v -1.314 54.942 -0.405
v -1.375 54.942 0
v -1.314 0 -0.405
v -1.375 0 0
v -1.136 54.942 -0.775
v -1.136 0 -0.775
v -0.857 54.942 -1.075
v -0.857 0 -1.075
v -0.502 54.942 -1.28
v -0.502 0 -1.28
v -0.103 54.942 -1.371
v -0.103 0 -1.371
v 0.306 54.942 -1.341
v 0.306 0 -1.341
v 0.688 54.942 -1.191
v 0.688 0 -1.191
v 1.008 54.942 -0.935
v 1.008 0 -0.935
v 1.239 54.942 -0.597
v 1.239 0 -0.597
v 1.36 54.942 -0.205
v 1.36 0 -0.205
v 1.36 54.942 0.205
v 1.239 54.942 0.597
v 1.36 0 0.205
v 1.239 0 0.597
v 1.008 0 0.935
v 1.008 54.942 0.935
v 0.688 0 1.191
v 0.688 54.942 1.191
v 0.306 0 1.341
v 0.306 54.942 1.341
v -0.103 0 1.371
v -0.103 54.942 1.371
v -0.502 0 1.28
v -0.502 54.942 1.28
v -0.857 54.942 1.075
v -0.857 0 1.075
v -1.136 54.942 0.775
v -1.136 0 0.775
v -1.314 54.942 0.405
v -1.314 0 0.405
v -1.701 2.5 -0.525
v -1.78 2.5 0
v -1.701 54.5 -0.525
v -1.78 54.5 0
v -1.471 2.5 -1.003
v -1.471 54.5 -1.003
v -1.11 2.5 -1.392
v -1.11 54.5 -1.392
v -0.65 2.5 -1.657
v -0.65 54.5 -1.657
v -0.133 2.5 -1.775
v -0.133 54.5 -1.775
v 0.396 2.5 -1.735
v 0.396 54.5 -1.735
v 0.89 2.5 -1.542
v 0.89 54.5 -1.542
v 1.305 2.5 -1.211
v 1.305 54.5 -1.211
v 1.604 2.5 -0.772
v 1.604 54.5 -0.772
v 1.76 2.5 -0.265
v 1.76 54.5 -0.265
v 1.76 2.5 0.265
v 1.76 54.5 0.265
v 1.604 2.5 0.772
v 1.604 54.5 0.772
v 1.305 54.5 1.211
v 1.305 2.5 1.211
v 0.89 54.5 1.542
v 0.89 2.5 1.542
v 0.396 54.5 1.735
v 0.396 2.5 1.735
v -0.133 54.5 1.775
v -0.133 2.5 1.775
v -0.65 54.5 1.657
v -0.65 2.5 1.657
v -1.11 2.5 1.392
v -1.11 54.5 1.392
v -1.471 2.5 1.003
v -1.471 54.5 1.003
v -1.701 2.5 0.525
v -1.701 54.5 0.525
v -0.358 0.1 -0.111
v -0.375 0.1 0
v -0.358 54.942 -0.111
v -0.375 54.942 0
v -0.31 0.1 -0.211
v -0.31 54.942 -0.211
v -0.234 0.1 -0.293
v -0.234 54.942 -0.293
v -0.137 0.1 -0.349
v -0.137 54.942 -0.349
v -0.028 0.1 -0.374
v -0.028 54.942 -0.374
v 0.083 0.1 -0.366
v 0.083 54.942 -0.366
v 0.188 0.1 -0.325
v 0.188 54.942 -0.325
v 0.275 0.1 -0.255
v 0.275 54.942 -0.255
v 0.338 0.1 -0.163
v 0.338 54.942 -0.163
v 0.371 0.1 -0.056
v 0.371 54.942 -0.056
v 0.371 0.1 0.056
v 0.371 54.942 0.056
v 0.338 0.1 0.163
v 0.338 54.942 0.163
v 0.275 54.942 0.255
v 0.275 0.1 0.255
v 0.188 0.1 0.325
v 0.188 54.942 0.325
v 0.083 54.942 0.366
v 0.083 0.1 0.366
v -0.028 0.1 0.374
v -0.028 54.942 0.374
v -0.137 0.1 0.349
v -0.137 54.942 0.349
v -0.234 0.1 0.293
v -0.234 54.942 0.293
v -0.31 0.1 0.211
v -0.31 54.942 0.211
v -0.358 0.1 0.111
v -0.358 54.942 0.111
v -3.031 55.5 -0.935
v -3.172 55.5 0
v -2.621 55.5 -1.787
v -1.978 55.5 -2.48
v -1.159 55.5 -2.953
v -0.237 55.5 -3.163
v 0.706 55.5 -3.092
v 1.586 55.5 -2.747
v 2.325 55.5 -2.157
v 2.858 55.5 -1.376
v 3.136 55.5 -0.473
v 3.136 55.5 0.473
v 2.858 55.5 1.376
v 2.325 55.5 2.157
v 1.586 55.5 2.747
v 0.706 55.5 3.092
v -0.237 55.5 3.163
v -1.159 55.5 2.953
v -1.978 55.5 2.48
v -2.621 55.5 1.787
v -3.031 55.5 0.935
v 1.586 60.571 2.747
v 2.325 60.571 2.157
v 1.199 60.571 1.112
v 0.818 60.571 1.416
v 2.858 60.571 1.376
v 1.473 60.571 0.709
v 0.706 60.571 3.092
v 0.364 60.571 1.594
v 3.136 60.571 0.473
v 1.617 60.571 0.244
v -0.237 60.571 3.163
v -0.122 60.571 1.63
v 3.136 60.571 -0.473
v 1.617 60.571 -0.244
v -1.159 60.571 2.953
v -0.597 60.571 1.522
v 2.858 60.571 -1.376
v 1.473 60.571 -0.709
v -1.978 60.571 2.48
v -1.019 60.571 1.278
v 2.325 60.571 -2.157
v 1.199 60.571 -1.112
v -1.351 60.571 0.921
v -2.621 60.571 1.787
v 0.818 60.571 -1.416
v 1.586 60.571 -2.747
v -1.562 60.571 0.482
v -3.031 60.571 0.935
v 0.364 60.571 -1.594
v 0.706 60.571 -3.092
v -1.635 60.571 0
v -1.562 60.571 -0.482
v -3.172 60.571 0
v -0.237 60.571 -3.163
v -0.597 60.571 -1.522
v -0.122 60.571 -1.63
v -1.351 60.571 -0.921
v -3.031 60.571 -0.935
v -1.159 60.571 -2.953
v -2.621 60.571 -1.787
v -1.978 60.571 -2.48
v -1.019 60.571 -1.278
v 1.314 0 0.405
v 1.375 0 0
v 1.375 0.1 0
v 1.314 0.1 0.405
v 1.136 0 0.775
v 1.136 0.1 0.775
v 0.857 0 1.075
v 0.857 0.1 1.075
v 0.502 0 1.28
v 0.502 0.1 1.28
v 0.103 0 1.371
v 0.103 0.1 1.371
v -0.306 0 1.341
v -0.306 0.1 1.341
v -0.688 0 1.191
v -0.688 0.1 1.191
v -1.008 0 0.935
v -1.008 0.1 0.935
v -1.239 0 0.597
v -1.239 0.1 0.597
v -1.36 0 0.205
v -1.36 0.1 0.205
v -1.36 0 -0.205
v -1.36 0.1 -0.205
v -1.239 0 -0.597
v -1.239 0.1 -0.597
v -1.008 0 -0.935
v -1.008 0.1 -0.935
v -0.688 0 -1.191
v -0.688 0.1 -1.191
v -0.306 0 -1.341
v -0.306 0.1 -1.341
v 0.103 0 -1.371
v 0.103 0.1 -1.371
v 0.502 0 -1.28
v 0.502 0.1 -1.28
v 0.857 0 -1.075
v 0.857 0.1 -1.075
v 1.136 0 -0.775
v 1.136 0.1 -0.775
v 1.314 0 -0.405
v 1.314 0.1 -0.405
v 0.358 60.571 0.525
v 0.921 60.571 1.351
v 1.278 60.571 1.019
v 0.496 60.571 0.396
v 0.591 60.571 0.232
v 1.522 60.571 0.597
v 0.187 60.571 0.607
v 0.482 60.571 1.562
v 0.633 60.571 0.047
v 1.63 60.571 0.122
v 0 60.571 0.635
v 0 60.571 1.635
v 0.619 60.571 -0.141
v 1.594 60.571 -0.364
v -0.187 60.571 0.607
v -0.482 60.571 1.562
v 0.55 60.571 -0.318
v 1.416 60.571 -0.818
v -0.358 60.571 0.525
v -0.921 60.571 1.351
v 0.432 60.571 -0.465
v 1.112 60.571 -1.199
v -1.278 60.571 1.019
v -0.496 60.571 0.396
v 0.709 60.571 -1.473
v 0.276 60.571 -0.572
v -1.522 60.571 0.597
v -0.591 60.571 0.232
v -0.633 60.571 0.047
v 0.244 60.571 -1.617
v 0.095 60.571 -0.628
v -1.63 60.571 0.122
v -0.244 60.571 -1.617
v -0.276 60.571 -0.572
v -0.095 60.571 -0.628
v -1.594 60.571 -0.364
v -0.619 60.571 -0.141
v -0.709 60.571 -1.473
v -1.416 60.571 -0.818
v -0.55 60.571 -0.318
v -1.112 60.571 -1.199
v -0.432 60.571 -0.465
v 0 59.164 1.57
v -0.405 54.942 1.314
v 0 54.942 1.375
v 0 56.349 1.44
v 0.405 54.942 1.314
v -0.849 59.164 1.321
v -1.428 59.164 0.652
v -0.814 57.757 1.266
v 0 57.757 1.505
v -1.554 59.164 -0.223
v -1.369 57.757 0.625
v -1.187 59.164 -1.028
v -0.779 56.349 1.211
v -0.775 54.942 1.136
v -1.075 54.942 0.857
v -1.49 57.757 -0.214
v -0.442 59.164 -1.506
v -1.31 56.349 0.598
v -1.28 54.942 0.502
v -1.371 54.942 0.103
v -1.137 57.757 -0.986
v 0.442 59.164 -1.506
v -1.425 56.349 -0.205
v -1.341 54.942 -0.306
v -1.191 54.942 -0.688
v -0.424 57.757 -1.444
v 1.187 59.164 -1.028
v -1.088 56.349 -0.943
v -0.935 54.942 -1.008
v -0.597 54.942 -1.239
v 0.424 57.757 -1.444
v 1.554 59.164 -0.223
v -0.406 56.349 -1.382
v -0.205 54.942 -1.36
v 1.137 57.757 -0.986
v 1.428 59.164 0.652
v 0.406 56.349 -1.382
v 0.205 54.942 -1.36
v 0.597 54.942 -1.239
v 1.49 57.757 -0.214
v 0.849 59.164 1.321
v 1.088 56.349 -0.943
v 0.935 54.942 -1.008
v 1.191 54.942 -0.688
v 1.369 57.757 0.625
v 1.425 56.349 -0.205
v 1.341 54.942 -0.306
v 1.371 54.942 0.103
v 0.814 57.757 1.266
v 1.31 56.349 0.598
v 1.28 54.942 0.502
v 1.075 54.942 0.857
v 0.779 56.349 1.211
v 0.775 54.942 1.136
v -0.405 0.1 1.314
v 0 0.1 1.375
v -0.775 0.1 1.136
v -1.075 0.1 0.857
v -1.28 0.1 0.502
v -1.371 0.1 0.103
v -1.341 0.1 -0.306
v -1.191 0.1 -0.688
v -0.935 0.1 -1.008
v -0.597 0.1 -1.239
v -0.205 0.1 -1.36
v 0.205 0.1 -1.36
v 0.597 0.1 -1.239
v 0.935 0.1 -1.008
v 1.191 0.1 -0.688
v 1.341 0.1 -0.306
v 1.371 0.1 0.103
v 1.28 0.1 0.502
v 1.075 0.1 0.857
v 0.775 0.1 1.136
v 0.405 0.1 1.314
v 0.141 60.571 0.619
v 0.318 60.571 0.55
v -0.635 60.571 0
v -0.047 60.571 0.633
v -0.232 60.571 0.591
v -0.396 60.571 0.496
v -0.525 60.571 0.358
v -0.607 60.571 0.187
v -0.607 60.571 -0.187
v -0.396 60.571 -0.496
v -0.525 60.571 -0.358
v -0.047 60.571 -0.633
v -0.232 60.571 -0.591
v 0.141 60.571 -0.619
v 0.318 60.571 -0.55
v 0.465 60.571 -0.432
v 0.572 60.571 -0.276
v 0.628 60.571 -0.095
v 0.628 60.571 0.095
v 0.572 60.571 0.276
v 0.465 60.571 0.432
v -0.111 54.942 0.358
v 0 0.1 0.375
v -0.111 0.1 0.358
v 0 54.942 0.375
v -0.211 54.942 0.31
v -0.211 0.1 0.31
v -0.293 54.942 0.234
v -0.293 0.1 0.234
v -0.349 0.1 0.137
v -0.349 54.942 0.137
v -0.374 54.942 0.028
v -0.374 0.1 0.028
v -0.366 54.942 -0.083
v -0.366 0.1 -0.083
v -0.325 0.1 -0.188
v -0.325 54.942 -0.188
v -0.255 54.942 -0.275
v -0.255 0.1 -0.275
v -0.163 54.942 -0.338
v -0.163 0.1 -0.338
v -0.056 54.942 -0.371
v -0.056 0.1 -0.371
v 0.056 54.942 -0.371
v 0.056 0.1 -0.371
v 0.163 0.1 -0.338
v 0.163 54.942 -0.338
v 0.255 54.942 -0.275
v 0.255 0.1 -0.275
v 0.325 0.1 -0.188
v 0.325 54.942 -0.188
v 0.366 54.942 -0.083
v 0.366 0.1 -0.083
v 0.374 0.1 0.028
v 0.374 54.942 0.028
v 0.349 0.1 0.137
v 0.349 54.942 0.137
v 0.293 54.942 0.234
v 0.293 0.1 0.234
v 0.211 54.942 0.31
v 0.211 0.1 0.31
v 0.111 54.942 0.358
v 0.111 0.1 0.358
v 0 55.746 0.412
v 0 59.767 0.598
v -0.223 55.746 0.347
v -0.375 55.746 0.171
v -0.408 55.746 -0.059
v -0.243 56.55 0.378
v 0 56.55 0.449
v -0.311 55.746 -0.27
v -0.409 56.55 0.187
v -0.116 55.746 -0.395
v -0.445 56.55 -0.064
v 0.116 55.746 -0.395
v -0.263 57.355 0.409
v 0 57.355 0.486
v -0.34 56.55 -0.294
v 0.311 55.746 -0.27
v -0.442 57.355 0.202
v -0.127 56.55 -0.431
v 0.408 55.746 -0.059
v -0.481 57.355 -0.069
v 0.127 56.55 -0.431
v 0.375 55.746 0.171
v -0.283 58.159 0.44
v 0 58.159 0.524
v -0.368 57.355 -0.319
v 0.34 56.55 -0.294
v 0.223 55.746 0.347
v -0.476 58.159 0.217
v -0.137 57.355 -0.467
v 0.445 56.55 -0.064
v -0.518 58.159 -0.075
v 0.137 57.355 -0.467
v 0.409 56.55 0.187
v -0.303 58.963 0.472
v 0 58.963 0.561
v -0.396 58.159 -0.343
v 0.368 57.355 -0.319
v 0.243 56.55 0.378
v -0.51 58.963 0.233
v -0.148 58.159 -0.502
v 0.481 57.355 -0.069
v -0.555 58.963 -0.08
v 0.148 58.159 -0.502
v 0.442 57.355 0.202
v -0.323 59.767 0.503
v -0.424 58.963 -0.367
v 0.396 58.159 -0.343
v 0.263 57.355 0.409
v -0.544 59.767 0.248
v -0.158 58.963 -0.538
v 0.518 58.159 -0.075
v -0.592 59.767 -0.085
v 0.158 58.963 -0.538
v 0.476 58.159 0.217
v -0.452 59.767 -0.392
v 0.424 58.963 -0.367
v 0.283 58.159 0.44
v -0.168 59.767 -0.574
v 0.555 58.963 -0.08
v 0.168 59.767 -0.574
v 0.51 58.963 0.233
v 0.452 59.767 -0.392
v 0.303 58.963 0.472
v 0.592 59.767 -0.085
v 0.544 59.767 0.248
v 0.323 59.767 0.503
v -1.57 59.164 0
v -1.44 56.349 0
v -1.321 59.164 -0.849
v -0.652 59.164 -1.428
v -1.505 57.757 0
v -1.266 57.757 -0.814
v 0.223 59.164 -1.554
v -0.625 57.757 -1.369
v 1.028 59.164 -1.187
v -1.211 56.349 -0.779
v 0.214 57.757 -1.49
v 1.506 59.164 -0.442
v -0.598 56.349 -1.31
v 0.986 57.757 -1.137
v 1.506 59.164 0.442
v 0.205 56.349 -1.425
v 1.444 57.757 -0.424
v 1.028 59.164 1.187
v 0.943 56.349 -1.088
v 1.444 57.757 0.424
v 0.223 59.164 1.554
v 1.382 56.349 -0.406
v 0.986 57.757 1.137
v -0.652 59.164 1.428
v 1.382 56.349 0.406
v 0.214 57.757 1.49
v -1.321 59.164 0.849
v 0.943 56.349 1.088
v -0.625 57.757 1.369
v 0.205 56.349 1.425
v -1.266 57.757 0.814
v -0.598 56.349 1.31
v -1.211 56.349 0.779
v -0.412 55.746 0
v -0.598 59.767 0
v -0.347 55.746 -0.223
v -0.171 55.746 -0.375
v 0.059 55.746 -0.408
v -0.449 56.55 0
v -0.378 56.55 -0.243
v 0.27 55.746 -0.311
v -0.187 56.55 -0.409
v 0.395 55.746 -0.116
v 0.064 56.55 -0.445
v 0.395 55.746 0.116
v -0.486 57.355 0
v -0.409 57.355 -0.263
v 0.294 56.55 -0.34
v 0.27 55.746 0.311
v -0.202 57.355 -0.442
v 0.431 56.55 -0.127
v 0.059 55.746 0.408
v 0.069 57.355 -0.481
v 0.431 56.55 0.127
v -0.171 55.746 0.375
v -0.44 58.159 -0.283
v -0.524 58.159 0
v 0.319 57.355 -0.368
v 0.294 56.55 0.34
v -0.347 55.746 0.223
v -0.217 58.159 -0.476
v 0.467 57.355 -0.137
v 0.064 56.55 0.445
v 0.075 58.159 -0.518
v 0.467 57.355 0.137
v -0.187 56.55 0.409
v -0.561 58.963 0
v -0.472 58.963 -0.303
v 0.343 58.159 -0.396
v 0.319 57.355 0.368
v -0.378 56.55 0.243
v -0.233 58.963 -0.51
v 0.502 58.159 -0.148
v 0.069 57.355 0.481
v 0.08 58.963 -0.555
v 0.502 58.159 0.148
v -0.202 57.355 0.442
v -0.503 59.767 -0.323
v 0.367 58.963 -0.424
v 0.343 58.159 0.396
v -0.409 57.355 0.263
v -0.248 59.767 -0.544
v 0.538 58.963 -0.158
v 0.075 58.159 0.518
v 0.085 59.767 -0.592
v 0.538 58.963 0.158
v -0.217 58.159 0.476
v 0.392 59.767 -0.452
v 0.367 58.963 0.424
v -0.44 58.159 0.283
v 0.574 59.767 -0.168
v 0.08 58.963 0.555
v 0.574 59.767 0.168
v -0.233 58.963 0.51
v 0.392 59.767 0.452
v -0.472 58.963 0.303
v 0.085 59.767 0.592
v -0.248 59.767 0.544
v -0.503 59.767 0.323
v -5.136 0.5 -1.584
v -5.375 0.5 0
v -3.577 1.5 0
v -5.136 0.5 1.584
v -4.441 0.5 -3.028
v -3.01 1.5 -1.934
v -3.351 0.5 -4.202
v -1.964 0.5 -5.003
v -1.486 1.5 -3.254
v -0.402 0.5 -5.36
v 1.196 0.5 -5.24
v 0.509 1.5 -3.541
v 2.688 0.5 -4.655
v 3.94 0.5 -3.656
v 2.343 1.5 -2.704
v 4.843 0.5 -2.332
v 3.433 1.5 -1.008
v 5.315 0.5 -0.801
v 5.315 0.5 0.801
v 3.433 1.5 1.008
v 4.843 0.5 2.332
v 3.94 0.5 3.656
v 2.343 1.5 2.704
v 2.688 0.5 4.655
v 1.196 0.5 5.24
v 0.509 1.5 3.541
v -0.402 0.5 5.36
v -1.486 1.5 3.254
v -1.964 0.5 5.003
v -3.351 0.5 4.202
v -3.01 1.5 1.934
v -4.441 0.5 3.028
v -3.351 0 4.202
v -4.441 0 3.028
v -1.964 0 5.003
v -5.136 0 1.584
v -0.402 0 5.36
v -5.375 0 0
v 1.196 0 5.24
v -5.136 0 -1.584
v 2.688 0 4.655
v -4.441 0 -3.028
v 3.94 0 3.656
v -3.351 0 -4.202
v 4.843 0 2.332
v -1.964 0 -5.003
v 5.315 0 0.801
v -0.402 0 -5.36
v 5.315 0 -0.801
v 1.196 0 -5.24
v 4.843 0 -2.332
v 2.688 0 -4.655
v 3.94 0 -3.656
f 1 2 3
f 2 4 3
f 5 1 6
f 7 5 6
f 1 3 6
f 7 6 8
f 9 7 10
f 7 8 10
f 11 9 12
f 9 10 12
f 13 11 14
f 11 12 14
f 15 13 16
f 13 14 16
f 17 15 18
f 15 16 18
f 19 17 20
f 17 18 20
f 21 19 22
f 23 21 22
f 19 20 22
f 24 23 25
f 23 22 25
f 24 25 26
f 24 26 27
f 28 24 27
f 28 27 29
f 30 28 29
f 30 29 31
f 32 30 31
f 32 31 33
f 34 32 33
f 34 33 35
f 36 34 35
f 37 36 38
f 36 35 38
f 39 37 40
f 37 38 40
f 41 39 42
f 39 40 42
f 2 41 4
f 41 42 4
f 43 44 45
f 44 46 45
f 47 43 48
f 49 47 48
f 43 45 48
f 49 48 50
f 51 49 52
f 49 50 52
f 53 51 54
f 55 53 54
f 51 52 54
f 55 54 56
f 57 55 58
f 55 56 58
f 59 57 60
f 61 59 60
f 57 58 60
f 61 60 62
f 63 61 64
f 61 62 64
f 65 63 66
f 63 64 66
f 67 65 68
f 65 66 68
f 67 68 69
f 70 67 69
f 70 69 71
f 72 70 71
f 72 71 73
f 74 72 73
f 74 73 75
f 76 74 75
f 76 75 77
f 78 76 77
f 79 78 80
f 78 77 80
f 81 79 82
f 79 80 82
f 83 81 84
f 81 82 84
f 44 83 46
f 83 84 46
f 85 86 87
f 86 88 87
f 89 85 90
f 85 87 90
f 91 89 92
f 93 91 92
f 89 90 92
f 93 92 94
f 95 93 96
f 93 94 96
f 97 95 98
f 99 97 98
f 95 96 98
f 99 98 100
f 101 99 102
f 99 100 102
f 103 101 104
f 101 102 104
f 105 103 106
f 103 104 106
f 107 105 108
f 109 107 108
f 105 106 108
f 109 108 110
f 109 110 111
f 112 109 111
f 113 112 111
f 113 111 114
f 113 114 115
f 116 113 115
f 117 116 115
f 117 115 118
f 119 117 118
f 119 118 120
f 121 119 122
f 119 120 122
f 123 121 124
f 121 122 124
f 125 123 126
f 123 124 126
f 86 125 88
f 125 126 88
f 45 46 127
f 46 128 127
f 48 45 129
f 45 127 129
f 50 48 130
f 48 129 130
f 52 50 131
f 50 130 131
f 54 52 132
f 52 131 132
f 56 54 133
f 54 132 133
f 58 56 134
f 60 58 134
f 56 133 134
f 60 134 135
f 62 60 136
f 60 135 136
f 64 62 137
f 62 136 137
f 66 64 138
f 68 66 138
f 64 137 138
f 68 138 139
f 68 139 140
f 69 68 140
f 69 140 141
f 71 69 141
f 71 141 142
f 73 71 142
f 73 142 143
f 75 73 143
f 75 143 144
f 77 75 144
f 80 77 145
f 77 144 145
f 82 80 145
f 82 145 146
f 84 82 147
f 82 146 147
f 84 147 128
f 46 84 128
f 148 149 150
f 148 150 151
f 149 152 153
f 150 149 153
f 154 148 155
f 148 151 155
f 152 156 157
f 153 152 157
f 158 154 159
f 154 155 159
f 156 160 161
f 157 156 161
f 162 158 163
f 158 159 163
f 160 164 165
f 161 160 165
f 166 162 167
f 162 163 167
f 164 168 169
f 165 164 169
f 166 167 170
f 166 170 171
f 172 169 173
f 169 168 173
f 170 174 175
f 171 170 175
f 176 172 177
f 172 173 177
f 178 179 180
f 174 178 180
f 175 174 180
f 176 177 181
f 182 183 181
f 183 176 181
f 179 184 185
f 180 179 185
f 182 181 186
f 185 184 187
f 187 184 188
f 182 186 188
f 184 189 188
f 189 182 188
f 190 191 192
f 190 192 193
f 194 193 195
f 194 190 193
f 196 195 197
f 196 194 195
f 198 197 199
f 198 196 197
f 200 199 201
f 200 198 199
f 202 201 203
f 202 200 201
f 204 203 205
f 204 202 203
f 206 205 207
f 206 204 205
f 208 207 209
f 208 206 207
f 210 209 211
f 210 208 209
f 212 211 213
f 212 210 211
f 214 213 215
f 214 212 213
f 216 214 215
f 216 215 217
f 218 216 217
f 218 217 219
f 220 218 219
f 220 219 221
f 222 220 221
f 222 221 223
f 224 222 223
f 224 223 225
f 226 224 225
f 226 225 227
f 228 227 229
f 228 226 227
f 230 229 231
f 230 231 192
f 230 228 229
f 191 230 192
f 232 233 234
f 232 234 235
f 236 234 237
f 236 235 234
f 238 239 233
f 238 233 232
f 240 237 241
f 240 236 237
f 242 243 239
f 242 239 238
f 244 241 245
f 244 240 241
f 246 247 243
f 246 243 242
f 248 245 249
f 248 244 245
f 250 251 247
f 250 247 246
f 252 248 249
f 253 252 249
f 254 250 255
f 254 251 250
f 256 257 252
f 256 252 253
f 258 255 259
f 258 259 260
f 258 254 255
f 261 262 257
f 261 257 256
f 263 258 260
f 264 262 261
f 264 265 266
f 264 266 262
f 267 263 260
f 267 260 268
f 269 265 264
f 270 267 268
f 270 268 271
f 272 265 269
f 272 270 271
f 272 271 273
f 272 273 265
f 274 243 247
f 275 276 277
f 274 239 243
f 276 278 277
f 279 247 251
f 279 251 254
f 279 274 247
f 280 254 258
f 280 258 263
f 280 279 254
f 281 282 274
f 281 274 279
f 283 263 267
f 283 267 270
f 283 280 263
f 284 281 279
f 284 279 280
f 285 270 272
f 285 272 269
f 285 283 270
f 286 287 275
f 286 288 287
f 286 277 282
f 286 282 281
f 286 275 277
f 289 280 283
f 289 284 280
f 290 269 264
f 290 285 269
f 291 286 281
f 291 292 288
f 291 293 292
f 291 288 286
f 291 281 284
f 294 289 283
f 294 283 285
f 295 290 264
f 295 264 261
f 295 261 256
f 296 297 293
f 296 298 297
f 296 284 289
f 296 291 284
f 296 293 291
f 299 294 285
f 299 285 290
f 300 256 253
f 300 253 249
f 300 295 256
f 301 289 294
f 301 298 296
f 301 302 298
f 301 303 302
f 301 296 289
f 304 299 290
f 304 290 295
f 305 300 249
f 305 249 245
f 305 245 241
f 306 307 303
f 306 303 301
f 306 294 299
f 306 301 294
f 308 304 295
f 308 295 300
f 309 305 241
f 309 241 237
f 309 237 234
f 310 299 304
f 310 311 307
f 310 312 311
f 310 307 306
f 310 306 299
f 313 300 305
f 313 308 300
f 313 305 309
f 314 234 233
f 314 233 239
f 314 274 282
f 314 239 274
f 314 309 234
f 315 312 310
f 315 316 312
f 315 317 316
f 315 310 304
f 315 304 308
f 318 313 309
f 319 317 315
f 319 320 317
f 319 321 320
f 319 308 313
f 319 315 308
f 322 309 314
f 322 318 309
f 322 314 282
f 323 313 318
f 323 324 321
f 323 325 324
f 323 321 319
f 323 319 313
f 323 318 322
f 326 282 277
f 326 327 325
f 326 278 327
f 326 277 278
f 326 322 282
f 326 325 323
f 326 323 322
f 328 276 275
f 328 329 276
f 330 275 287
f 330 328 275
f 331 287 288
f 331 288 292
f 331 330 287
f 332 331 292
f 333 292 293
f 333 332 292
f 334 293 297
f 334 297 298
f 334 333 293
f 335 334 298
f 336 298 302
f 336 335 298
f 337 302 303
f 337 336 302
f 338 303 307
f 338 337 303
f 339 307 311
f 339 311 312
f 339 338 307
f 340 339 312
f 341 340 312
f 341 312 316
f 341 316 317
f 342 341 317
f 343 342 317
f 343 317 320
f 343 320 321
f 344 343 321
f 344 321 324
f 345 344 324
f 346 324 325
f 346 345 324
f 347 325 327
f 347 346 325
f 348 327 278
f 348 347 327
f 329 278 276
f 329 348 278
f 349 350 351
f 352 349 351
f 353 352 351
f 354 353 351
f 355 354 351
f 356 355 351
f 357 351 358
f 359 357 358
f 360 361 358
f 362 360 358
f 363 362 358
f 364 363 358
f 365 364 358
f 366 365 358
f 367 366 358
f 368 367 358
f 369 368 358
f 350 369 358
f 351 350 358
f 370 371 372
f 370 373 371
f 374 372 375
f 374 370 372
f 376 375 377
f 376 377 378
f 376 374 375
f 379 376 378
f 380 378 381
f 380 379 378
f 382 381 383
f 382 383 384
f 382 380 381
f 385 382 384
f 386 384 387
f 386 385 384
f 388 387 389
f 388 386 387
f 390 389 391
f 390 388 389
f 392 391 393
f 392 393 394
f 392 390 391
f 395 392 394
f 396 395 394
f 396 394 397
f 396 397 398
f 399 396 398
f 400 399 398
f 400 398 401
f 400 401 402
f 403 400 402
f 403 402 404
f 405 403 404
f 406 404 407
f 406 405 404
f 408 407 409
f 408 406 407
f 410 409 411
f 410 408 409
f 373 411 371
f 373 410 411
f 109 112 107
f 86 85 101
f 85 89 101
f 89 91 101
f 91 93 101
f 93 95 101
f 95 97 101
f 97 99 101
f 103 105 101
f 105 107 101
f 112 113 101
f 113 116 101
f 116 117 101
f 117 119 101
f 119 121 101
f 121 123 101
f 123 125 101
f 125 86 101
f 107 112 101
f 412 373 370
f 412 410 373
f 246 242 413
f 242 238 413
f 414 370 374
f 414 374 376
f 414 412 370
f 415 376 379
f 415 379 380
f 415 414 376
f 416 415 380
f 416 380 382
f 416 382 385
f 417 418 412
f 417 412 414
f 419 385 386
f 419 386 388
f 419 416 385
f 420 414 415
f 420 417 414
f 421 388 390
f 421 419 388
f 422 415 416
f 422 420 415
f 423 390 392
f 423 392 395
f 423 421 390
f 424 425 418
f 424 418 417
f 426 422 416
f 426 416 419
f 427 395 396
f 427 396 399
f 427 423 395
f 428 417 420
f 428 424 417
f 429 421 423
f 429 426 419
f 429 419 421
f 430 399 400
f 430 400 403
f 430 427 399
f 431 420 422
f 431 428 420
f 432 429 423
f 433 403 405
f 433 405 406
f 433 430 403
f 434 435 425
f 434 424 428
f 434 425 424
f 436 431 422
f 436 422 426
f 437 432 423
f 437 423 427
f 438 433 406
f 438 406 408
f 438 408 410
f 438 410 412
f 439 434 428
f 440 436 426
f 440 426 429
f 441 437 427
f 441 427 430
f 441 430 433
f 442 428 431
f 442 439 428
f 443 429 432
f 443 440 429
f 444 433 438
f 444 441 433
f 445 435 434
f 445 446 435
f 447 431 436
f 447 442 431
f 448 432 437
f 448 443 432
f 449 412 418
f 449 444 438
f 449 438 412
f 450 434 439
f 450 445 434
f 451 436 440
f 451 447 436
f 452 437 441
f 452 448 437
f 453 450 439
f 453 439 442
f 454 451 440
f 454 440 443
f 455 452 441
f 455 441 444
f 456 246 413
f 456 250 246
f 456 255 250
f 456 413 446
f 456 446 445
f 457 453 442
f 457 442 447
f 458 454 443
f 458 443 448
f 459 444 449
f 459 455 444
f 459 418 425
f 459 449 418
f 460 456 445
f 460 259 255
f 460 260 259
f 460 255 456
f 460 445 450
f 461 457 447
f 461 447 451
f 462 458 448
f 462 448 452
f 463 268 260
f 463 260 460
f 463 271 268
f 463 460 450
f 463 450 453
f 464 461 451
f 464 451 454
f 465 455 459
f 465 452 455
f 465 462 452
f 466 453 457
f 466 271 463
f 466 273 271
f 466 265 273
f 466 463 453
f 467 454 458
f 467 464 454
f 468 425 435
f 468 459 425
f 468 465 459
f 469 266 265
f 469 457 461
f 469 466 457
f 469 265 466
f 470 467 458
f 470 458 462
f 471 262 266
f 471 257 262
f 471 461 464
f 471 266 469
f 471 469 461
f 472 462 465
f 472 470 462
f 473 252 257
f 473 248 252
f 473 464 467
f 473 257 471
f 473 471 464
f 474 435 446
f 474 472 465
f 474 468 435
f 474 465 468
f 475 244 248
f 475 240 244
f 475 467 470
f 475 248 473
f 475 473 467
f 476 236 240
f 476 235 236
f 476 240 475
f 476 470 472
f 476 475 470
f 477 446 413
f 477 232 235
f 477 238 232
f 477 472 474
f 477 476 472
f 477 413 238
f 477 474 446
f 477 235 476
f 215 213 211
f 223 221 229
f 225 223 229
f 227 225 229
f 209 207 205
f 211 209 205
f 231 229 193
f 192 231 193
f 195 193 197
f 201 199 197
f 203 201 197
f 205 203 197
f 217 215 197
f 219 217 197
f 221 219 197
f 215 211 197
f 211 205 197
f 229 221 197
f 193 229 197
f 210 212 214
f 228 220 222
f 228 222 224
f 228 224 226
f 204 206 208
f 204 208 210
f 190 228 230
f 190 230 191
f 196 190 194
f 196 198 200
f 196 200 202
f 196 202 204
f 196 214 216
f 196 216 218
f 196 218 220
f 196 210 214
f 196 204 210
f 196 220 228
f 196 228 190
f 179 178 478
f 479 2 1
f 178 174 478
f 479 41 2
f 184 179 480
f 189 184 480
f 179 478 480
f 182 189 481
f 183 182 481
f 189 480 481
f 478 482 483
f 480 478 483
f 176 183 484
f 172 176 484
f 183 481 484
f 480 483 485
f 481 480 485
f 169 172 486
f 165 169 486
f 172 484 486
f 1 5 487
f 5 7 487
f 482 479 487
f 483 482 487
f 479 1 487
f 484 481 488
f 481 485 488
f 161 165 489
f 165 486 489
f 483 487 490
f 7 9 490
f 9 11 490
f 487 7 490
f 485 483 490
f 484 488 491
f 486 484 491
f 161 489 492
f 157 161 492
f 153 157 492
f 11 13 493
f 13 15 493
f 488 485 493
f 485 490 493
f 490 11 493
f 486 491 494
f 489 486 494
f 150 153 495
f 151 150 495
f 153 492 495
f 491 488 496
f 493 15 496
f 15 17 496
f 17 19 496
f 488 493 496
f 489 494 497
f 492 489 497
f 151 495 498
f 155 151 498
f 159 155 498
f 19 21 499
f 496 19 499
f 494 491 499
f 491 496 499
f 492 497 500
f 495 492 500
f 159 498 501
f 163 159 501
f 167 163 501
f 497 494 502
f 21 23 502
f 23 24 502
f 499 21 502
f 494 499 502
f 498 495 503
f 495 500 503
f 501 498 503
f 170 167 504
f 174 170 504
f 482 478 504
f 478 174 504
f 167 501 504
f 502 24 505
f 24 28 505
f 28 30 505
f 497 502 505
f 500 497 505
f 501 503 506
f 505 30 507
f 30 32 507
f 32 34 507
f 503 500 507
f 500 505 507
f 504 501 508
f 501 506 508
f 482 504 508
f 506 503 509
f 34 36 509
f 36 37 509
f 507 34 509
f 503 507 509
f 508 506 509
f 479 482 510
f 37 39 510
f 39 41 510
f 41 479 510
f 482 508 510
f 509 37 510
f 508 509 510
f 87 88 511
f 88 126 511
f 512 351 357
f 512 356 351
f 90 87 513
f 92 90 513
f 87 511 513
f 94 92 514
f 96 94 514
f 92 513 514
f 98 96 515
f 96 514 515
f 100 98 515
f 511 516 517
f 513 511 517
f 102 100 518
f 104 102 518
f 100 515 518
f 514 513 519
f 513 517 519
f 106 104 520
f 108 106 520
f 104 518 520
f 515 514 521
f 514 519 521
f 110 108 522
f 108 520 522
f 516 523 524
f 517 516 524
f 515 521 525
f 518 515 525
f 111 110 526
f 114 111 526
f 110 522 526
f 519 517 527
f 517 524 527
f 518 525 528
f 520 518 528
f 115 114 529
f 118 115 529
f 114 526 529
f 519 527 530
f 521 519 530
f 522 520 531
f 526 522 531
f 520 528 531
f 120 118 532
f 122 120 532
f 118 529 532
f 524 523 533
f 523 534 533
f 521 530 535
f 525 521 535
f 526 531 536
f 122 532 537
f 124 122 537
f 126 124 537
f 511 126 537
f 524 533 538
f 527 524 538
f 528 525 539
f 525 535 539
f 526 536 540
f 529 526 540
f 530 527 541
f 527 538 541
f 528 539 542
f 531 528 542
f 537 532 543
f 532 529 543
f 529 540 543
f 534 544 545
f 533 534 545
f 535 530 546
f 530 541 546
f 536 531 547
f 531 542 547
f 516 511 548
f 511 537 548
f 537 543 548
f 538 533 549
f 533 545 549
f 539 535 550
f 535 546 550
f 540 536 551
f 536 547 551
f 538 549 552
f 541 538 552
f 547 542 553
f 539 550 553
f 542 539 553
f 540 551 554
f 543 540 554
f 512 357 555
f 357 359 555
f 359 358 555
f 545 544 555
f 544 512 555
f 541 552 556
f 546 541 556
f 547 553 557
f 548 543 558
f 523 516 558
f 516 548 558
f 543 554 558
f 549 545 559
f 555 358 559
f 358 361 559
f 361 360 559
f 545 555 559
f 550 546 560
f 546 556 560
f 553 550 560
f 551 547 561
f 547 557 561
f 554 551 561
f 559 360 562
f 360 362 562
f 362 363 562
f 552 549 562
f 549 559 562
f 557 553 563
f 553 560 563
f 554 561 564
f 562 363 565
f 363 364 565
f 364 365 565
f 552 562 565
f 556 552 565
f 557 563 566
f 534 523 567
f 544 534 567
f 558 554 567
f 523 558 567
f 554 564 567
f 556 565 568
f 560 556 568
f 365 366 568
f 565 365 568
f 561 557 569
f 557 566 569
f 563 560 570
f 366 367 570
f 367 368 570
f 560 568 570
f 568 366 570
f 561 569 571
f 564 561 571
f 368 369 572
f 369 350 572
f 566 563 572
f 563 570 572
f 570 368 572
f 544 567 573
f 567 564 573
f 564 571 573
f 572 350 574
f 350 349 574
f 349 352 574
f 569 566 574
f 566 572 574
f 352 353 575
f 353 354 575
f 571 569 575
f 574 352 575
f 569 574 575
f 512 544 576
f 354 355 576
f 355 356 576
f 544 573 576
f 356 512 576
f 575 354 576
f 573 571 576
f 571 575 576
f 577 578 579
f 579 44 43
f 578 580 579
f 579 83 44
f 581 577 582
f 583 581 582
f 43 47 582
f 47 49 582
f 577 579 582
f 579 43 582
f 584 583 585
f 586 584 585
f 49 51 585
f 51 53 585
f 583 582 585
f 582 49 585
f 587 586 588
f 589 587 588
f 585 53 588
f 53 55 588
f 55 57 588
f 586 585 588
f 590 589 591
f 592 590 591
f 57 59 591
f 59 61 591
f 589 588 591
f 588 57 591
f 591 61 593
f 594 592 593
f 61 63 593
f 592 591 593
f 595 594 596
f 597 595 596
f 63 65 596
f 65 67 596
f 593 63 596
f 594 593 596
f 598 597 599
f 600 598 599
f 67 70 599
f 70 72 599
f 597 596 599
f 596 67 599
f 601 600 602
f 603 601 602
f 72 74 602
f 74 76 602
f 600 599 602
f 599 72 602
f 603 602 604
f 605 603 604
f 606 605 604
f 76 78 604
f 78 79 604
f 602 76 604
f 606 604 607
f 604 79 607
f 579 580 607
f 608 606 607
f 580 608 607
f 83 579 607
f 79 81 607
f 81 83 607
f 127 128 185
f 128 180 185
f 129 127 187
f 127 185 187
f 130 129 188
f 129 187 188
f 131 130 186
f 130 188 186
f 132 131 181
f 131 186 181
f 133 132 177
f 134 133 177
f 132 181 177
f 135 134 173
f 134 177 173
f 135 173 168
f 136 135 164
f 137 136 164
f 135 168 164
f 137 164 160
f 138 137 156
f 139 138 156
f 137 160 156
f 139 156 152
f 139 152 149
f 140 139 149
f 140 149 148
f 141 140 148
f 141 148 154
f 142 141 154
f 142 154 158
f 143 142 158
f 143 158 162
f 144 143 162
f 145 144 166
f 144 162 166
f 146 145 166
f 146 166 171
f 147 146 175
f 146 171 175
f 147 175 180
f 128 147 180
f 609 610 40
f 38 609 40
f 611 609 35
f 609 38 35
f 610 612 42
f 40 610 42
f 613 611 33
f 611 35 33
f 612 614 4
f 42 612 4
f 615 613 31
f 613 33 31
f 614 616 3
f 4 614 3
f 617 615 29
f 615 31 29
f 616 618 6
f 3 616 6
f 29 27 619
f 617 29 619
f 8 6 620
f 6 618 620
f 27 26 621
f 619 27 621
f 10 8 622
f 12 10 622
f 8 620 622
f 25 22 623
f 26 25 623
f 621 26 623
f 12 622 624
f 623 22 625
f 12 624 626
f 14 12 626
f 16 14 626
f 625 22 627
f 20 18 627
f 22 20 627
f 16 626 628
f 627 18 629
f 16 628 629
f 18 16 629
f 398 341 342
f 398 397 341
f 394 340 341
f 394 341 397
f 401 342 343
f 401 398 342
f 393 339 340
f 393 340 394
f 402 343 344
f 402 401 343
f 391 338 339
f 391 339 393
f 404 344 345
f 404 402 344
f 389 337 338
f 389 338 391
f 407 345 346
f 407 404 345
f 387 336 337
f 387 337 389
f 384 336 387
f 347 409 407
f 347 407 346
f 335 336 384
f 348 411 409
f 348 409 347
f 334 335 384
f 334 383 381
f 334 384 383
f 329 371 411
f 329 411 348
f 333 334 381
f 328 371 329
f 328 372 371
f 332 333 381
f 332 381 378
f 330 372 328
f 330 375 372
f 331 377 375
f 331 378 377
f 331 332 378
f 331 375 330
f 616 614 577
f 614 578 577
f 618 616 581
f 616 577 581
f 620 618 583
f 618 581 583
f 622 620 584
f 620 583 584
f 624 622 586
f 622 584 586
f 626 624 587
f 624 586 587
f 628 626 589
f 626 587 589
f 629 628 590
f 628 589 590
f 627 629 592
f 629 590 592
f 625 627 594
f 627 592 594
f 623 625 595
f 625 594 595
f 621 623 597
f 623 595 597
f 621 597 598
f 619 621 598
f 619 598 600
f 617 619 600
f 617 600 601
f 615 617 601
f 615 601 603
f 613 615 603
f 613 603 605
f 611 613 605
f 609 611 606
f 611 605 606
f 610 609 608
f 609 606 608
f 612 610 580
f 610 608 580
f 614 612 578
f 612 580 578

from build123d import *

# Parameters (mm, degrees)
CROQUIS4_R              = 1.375
SALIENTE_EXTRUIR1_DEPTH = 0.1


with BuildPart() as part:
    # Croquis1 → Revolución1 (revolve)
    with BuildSketch(Plane.XY, mode=Mode.PRIVATE) as revoluci_n1_sk:
        Polygon((5.375, 0), (5.375, 0.5), (1.78, 2.5), (1.78, 54.5), (3.171785891, 55.5), (3.171785891, 60.571), (1.635, 60.571), (1.375, 54.942193309), (1.375, 0), align=None)
        Polygon((0.375, 0.1), (0.375, 54.942193309), (0.635, 60.571), (0.442390715, 60.571), (0, 60.571), (0, 0.1), align=None)
    revolve(revoluci_n1_sk.sketch.rotate(Axis((0, 60.571, 0), (0, -1, 0)), 180), axis=Axis((0, 60.571, 0), (0, -1, 0)))


with BuildPart() as body_2:
    # Croquis3 → Revolución2 (revolve)
    with BuildSketch(Plane.XY, mode=Mode.PRIVATE) as revoluci_n2_sk:
        Polygon((0.375, 54.942193309), (0.635, 60.571), (1.635, 60.571), (1.375, 54.942193309), (1.375, 0.1), (0.375, 0.1), align=None)
    revolve(revoluci_n2_sk.sketch.rotate(Axis((0, 55.5, 0), (0, -1, 0)), 90), axis=Axis((0, 55.5, 0), (0, -1, 0)))


with BuildPart() as body_3:
    # Croquis4 → Saliente-Extruir1 (new body)
    with BuildSketch(Plane.XZ):
        Circle(CROQUIS4_R)
    extrude(amount=-SALIENTE_EXTRUIR1_DEPTH)


solid = Compound([part.part, body_2.part, body_3.part])
